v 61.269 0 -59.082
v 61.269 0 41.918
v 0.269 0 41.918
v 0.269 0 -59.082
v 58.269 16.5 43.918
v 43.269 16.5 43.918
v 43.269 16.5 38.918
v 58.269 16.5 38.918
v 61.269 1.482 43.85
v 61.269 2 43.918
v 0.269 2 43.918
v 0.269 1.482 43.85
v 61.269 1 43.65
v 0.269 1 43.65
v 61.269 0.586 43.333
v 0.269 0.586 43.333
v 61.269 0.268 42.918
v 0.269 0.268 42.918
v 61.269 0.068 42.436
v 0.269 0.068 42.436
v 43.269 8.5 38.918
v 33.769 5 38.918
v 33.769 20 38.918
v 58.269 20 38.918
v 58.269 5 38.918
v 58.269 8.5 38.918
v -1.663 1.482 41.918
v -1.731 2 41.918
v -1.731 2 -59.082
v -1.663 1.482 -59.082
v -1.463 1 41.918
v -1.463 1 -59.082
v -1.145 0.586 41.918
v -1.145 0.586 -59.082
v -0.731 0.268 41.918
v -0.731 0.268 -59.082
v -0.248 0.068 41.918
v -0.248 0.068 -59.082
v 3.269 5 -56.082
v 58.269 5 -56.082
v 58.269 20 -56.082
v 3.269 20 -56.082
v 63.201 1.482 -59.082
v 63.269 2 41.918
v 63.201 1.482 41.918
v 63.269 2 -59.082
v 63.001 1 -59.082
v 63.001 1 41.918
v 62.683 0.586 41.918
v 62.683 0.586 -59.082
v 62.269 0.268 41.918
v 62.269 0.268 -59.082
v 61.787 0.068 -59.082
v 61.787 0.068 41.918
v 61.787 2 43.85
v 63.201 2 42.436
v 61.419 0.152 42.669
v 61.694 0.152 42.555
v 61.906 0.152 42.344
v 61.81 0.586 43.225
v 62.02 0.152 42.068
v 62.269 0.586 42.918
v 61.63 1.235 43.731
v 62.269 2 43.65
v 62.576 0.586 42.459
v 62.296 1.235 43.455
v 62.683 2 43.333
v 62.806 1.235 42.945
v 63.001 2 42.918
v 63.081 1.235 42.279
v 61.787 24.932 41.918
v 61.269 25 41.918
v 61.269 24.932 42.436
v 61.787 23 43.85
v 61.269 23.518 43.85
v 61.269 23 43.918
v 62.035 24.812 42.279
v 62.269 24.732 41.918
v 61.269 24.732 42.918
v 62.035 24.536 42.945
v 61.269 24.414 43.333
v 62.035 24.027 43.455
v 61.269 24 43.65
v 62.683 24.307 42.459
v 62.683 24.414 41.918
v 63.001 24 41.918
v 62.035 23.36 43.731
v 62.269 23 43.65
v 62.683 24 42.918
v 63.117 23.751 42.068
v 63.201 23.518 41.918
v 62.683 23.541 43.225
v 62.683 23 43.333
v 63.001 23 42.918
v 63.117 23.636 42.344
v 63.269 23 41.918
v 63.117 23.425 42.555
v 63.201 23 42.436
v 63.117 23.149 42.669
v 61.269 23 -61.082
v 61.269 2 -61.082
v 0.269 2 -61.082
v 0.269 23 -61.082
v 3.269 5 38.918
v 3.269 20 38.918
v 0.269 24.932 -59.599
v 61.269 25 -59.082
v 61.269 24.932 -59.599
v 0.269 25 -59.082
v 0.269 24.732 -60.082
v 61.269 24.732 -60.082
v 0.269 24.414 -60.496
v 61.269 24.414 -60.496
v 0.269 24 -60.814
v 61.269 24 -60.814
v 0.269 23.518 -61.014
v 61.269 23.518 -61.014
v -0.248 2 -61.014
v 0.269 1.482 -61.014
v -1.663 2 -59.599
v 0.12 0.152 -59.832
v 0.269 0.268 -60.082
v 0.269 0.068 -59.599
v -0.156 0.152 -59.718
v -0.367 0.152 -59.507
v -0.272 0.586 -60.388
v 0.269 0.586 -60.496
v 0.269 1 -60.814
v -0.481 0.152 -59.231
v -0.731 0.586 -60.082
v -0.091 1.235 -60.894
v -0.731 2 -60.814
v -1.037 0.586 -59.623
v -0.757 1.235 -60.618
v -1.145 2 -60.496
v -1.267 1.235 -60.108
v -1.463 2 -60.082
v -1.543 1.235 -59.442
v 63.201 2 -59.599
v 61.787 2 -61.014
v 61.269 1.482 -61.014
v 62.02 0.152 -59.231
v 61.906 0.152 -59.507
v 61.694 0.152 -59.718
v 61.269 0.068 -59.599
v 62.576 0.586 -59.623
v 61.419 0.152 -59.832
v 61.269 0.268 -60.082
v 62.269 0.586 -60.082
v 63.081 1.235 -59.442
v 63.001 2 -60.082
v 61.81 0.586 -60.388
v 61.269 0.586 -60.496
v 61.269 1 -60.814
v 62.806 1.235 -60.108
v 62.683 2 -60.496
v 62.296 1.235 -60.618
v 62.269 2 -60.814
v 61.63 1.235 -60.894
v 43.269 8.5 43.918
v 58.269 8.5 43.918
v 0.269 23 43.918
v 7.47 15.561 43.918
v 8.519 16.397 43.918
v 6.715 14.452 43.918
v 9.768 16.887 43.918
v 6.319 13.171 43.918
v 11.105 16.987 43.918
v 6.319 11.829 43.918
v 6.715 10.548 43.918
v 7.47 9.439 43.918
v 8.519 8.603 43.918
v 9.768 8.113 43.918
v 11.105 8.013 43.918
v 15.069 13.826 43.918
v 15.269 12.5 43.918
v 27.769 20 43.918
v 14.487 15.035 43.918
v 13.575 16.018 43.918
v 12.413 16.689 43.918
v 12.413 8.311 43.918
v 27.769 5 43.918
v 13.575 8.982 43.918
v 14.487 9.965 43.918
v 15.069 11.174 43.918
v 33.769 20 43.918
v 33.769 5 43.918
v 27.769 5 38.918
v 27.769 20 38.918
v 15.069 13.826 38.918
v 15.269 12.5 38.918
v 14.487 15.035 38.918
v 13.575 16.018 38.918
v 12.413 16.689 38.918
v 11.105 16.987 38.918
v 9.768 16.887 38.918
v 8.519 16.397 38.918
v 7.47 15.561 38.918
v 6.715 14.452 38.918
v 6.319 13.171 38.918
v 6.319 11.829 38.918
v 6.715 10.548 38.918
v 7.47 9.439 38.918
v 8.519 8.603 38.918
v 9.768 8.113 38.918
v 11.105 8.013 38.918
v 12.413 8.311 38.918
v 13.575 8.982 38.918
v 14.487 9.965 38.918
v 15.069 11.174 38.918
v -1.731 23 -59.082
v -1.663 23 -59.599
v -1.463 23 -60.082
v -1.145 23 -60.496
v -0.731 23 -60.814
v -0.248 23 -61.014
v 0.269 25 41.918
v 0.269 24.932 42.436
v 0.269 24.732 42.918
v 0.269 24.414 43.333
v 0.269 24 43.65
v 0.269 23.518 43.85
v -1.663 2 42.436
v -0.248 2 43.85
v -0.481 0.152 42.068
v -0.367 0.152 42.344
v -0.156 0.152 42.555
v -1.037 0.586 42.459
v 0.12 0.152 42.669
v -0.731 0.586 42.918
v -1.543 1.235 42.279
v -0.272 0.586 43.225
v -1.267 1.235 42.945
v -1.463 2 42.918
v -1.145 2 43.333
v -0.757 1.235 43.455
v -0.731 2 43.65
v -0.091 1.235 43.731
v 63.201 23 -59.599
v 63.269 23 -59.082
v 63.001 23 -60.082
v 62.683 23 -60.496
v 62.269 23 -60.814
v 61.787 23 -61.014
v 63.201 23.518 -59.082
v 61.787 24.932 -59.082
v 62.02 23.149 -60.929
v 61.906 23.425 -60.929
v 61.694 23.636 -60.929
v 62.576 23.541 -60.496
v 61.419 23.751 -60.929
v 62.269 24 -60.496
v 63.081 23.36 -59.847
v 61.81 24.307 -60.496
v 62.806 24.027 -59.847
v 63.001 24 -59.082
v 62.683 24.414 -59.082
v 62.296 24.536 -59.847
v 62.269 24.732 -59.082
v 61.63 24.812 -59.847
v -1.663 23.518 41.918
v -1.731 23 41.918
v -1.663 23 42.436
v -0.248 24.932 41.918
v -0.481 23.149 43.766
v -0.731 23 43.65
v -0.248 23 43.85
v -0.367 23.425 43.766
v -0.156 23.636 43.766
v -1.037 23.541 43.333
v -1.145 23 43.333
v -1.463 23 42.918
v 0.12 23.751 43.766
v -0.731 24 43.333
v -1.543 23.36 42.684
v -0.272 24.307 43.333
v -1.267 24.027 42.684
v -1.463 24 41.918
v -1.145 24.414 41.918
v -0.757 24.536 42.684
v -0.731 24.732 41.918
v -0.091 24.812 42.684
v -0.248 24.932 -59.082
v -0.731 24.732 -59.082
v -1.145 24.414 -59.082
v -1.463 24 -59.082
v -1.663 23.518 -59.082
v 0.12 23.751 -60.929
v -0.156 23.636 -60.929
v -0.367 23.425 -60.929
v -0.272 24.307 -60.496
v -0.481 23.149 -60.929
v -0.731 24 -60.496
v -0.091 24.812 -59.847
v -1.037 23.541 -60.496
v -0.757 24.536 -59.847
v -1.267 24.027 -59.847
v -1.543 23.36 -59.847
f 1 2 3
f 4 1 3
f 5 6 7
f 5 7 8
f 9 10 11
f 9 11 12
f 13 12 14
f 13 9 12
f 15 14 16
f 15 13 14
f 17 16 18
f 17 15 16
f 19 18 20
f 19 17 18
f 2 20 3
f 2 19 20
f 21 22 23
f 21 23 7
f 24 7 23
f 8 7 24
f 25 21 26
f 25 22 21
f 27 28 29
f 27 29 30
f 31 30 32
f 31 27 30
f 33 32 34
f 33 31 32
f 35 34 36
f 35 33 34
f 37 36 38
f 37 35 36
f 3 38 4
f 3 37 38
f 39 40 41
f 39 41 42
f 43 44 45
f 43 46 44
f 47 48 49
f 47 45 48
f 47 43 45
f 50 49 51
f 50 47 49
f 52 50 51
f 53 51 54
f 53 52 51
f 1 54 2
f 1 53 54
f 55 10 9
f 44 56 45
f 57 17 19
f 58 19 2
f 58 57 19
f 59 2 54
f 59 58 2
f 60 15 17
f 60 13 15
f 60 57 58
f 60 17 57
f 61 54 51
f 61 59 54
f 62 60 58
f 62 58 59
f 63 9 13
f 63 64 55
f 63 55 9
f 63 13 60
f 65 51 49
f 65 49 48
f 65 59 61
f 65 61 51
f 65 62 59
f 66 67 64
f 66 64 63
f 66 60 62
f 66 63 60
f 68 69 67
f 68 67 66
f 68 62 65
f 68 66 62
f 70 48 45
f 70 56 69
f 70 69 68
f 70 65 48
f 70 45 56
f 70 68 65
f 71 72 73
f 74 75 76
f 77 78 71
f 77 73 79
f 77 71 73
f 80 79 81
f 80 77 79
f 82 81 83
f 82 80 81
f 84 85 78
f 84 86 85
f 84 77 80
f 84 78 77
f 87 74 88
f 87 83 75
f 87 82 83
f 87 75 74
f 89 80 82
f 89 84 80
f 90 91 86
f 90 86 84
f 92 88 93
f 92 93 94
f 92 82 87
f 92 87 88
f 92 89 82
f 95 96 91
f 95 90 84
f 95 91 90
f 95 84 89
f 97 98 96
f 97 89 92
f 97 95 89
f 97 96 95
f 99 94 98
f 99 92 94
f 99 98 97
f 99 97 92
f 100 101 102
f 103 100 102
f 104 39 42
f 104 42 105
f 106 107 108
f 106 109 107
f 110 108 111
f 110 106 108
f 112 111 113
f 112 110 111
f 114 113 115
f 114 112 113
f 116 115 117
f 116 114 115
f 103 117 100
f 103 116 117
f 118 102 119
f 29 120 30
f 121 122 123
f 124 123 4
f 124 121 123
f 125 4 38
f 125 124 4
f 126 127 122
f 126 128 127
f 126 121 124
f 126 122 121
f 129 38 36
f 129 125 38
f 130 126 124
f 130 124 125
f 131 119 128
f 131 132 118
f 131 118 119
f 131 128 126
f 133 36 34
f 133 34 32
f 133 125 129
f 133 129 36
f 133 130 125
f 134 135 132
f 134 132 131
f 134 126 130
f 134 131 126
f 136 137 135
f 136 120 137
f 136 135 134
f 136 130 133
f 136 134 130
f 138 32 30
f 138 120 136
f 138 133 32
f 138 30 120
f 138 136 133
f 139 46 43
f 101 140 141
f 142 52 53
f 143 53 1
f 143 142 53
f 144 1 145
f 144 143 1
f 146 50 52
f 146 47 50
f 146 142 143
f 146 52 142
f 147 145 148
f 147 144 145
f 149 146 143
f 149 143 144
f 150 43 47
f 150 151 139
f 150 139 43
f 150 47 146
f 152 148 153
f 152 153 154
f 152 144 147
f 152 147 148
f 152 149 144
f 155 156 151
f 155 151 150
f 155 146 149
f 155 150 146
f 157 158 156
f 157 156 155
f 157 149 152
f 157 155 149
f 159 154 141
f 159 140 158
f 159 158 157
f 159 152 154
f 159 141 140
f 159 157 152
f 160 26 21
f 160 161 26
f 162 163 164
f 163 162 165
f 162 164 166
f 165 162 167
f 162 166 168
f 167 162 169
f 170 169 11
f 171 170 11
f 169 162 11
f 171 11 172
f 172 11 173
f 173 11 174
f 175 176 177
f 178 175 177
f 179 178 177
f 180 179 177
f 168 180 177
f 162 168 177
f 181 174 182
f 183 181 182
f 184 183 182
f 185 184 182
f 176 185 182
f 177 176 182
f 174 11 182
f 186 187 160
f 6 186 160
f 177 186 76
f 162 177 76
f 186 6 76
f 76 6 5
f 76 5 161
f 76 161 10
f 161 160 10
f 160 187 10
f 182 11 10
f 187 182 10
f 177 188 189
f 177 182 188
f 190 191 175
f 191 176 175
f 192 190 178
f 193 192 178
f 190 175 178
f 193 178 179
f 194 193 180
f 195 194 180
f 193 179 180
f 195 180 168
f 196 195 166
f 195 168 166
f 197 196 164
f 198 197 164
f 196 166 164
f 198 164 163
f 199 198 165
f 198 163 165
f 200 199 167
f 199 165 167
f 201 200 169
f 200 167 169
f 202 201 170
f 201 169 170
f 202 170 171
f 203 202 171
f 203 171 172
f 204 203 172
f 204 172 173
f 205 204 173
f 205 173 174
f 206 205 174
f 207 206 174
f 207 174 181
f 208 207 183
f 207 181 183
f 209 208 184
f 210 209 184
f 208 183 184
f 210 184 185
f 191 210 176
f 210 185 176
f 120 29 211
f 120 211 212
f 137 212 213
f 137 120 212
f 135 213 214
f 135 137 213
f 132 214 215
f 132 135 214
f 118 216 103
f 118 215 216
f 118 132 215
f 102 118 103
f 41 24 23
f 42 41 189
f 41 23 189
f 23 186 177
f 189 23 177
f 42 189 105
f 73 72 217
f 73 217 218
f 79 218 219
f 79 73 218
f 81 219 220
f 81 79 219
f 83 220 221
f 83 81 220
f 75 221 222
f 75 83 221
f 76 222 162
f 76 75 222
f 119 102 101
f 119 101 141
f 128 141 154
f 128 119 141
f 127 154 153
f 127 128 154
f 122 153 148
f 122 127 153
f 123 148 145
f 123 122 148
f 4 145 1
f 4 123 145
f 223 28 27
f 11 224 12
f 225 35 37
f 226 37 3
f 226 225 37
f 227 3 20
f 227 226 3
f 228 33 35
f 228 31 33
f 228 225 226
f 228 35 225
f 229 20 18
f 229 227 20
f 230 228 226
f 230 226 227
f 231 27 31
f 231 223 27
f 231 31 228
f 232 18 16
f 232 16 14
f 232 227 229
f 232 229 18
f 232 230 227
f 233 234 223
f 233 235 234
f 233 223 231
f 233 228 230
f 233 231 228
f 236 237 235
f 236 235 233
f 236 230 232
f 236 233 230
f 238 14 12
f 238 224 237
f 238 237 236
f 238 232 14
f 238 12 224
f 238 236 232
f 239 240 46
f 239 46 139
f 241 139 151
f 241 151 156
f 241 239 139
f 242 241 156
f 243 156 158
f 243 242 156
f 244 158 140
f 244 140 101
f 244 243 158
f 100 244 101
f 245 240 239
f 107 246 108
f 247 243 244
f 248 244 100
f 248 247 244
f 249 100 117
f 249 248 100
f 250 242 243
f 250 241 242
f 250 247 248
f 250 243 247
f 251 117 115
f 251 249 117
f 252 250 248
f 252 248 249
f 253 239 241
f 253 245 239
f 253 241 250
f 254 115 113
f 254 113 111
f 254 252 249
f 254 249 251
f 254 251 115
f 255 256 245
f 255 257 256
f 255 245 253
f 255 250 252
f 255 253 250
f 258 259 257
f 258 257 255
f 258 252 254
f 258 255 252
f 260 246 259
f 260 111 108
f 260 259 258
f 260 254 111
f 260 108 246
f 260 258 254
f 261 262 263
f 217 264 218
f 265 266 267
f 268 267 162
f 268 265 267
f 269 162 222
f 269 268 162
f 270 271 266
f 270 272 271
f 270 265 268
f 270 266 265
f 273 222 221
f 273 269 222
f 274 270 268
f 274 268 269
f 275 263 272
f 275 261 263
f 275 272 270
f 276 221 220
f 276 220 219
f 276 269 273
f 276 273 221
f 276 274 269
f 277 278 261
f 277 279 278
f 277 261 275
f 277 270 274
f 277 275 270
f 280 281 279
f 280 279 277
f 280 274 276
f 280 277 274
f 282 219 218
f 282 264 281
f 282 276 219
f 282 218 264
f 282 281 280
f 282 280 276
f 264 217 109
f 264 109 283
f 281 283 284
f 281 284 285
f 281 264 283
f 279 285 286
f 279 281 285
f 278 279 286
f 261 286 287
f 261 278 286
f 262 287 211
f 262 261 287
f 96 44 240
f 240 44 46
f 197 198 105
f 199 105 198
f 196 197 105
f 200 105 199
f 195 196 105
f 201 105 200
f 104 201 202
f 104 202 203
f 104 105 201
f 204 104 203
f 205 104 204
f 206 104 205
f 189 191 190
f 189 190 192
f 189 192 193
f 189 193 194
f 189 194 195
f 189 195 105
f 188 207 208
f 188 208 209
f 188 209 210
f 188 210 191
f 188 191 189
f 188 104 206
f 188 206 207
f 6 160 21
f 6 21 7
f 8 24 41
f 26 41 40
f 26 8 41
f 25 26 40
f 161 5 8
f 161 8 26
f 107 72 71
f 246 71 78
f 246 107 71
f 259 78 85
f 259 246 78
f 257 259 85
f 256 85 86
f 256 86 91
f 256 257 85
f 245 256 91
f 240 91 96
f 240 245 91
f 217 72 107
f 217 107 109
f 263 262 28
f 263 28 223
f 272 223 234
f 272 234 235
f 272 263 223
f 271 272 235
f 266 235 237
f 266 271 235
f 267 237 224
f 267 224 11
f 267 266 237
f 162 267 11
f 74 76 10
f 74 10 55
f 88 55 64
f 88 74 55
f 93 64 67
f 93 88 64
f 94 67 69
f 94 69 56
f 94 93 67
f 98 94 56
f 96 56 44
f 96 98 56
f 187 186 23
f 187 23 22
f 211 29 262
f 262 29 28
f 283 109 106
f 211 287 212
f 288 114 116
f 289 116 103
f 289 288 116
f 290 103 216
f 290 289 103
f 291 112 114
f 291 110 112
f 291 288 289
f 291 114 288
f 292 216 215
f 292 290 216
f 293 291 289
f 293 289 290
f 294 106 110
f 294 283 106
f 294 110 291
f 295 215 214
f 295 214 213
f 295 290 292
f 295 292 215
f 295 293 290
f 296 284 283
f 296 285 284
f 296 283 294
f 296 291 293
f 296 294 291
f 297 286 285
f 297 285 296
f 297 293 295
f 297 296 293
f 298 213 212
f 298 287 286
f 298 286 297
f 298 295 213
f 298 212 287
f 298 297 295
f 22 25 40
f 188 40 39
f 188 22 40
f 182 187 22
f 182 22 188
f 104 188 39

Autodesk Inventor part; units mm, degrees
ref_plane "YZ Plane" through (0, 0, 0) normal (1, 0, 0) x (0, 1, 0)
ref_plane "XZ Plane" through (0, 0, 0) normal (0, 1, 0) x (-1, 0, 0)
ref_plane "XY Plane" through (0, 0, 0) normal (0, 0, 1) x (1, 0, 0)
sketch "Boceto1" plane through (0, 0, 0) normal (0, 1, 0) x (-1, 0, 0)
  line L0 (1.7308, 43.9183) -> (-63.2692, 43.9183)
  line L1 (-63.2692, 43.9183) -> (-63.2692, -61.0817)
  line L2 (-63.2692, -61.0817) -> (1.7308, -61.0817)
  line L3 (1.7308, -61.0817) -> (1.7308, 43.9183)
  point P0 (0, 0)
  dimension "d0" = 105
  dimension "d1" = 65
extrude "Extrusión1" add sketch "Boceto1" along normal blind 25
shell "Vaciado1" thickness 5 removed faces 1 at (19.9359, 25, -26.0817)
sketch "Boceto2" plane through (0, 25, 0) normal (0, 1, 0) x (1, 0, 0)
  line L0 (3.2692, 56.0817) -> (3.2692, -38.9183) projected
  line L1 (58.2692, 56.0817) -> (3.2692, 56.0817)
  line L2 (3.2692, 56.0817) -> (3.2692, -38.9183)
  line L3 (3.2692, -38.9183) -> (58.2692, -38.9183)
  line L4 (58.2692, -38.9183) -> (58.2692, 56.0817)
  point P0 (0, 0)
extrude "Extrusión2" add sketch "Boceto2" against normal blind 5
sketch "Boceto3" plane through (-1.7308, 0, 43.9183) normal (0, 0, 1) x (1, 0, 0)
  circle A0 centre (12.5, 12.5) radius 4.5
  line L0 (0, 0) -> (65, 0) projected
  line L1 (0, 0) -> (0, 25) projected
  point P0 (1.7308, 0)
  dimension "d12" = 9
  dimension "d13" = 12.5
  dimension "d14" = 12.5
extrude "Extrusión3" cut sketch "Boceto3" against normal blind 5
sketch "Boceto4" plane through (-1.7308, 0, 43.9183) normal (0, 0, 1) x (1, 0, 0)
  line L0 (60, 20) -> (5, 20) projected
  line L1 (60, 5) -> (5, 5) projected
  line L2 (29.5, 20) -> (35.5, 20)
  line L3 (35.5, 20) -> (35.5, 5)
  line L4 (35.5, 5) -> (29.5, 5)
  line L5 (29.5, 5) -> (29.5, 20)
  line L6 (0, 0) -> (0, 25) projected
  line L7 (65, 0) -> (65, 25) projected
  point P0 (1.7308, 0)
  point P1 (29.5, 12.5)
  point P2 (0, 12.5)
  dimension "d17" = 6
  dimension "d18" = 29.5
  dimension "d19" = 29.5
extrude "Extrusión4" cut sketch "Boceto4" against normal blind 5
sketch "Boceto5" plane through (-1.7308, 0, 43.9183) normal (0, 0, 1) x (1, 0, 0)
  line L0 (45, 16.5) -> (60, 16.5)
  line L1 (60, 16.5) -> (60, 8.5)
  line L2 (60, 8.5) -> (45, 8.5)
  line L3 (45, 8.5) -> (45, 16.5)
  line L4 (0, 25) -> (65, 25) projected
  line L5 (0, 0) -> (65, 0) projected
  line L6 (65, 0) -> (65, 25) projected
  point P0 (1.7308, 0)
  point P1 (52.5, 8.5)
  point P2 (52.5, 16.5)
  point P3 (60, 12.5)
  point P4 (45, 12.5)
  point P5 (65, 12.5)
  dimension "d22" = 8
  dimension "d23" = 15
  dimension "d24" = 8.5
  dimension "d25" = 8.5
  dimension "d26" = 5
extrude "Extrusión5" cut sketch "Boceto5" against normal blind 5
fillet "Empalme6" radius 2 1 edges at (-1.7308, 25, -8.5817)
fillet "Empalme7" radius 2 3 edges at (31.7692, 25, 43.9183) (-1.145, 24.4142, 43.9183) (-1.7308, 11.5, 43.9183)
fillet "Empalme8" radius 2 3 edges at (63.2692, 25, -9.5817) (63.2692, 24.4142, 43.3325) (63.2692, 11.5, 43.9183)
fillet "Empalme9" radius 2 5 edges at (30.7692, 25, -61.0817) (-1.145, 24.4142, -61.0817) (-1.7308, 11.5, -61.0817) (62.6834, 24.4142, -61.0817) (63.2692, 11.5, -61.0817)
fillet "Empalme10" radius 2 8 edges at (63.2692, 0, -8.5817) (62.6834, 0, -60.4959) (30.7692, 0, -61.0817) (-1.145, 0, -60.4959) (-1.7308, 0, -8.5817) (-1.145, 0, 43.3325) (30.7692, 0, 43.9183) (62.6834, 0, 43.3325)
properties part number "Lithium Battery"
